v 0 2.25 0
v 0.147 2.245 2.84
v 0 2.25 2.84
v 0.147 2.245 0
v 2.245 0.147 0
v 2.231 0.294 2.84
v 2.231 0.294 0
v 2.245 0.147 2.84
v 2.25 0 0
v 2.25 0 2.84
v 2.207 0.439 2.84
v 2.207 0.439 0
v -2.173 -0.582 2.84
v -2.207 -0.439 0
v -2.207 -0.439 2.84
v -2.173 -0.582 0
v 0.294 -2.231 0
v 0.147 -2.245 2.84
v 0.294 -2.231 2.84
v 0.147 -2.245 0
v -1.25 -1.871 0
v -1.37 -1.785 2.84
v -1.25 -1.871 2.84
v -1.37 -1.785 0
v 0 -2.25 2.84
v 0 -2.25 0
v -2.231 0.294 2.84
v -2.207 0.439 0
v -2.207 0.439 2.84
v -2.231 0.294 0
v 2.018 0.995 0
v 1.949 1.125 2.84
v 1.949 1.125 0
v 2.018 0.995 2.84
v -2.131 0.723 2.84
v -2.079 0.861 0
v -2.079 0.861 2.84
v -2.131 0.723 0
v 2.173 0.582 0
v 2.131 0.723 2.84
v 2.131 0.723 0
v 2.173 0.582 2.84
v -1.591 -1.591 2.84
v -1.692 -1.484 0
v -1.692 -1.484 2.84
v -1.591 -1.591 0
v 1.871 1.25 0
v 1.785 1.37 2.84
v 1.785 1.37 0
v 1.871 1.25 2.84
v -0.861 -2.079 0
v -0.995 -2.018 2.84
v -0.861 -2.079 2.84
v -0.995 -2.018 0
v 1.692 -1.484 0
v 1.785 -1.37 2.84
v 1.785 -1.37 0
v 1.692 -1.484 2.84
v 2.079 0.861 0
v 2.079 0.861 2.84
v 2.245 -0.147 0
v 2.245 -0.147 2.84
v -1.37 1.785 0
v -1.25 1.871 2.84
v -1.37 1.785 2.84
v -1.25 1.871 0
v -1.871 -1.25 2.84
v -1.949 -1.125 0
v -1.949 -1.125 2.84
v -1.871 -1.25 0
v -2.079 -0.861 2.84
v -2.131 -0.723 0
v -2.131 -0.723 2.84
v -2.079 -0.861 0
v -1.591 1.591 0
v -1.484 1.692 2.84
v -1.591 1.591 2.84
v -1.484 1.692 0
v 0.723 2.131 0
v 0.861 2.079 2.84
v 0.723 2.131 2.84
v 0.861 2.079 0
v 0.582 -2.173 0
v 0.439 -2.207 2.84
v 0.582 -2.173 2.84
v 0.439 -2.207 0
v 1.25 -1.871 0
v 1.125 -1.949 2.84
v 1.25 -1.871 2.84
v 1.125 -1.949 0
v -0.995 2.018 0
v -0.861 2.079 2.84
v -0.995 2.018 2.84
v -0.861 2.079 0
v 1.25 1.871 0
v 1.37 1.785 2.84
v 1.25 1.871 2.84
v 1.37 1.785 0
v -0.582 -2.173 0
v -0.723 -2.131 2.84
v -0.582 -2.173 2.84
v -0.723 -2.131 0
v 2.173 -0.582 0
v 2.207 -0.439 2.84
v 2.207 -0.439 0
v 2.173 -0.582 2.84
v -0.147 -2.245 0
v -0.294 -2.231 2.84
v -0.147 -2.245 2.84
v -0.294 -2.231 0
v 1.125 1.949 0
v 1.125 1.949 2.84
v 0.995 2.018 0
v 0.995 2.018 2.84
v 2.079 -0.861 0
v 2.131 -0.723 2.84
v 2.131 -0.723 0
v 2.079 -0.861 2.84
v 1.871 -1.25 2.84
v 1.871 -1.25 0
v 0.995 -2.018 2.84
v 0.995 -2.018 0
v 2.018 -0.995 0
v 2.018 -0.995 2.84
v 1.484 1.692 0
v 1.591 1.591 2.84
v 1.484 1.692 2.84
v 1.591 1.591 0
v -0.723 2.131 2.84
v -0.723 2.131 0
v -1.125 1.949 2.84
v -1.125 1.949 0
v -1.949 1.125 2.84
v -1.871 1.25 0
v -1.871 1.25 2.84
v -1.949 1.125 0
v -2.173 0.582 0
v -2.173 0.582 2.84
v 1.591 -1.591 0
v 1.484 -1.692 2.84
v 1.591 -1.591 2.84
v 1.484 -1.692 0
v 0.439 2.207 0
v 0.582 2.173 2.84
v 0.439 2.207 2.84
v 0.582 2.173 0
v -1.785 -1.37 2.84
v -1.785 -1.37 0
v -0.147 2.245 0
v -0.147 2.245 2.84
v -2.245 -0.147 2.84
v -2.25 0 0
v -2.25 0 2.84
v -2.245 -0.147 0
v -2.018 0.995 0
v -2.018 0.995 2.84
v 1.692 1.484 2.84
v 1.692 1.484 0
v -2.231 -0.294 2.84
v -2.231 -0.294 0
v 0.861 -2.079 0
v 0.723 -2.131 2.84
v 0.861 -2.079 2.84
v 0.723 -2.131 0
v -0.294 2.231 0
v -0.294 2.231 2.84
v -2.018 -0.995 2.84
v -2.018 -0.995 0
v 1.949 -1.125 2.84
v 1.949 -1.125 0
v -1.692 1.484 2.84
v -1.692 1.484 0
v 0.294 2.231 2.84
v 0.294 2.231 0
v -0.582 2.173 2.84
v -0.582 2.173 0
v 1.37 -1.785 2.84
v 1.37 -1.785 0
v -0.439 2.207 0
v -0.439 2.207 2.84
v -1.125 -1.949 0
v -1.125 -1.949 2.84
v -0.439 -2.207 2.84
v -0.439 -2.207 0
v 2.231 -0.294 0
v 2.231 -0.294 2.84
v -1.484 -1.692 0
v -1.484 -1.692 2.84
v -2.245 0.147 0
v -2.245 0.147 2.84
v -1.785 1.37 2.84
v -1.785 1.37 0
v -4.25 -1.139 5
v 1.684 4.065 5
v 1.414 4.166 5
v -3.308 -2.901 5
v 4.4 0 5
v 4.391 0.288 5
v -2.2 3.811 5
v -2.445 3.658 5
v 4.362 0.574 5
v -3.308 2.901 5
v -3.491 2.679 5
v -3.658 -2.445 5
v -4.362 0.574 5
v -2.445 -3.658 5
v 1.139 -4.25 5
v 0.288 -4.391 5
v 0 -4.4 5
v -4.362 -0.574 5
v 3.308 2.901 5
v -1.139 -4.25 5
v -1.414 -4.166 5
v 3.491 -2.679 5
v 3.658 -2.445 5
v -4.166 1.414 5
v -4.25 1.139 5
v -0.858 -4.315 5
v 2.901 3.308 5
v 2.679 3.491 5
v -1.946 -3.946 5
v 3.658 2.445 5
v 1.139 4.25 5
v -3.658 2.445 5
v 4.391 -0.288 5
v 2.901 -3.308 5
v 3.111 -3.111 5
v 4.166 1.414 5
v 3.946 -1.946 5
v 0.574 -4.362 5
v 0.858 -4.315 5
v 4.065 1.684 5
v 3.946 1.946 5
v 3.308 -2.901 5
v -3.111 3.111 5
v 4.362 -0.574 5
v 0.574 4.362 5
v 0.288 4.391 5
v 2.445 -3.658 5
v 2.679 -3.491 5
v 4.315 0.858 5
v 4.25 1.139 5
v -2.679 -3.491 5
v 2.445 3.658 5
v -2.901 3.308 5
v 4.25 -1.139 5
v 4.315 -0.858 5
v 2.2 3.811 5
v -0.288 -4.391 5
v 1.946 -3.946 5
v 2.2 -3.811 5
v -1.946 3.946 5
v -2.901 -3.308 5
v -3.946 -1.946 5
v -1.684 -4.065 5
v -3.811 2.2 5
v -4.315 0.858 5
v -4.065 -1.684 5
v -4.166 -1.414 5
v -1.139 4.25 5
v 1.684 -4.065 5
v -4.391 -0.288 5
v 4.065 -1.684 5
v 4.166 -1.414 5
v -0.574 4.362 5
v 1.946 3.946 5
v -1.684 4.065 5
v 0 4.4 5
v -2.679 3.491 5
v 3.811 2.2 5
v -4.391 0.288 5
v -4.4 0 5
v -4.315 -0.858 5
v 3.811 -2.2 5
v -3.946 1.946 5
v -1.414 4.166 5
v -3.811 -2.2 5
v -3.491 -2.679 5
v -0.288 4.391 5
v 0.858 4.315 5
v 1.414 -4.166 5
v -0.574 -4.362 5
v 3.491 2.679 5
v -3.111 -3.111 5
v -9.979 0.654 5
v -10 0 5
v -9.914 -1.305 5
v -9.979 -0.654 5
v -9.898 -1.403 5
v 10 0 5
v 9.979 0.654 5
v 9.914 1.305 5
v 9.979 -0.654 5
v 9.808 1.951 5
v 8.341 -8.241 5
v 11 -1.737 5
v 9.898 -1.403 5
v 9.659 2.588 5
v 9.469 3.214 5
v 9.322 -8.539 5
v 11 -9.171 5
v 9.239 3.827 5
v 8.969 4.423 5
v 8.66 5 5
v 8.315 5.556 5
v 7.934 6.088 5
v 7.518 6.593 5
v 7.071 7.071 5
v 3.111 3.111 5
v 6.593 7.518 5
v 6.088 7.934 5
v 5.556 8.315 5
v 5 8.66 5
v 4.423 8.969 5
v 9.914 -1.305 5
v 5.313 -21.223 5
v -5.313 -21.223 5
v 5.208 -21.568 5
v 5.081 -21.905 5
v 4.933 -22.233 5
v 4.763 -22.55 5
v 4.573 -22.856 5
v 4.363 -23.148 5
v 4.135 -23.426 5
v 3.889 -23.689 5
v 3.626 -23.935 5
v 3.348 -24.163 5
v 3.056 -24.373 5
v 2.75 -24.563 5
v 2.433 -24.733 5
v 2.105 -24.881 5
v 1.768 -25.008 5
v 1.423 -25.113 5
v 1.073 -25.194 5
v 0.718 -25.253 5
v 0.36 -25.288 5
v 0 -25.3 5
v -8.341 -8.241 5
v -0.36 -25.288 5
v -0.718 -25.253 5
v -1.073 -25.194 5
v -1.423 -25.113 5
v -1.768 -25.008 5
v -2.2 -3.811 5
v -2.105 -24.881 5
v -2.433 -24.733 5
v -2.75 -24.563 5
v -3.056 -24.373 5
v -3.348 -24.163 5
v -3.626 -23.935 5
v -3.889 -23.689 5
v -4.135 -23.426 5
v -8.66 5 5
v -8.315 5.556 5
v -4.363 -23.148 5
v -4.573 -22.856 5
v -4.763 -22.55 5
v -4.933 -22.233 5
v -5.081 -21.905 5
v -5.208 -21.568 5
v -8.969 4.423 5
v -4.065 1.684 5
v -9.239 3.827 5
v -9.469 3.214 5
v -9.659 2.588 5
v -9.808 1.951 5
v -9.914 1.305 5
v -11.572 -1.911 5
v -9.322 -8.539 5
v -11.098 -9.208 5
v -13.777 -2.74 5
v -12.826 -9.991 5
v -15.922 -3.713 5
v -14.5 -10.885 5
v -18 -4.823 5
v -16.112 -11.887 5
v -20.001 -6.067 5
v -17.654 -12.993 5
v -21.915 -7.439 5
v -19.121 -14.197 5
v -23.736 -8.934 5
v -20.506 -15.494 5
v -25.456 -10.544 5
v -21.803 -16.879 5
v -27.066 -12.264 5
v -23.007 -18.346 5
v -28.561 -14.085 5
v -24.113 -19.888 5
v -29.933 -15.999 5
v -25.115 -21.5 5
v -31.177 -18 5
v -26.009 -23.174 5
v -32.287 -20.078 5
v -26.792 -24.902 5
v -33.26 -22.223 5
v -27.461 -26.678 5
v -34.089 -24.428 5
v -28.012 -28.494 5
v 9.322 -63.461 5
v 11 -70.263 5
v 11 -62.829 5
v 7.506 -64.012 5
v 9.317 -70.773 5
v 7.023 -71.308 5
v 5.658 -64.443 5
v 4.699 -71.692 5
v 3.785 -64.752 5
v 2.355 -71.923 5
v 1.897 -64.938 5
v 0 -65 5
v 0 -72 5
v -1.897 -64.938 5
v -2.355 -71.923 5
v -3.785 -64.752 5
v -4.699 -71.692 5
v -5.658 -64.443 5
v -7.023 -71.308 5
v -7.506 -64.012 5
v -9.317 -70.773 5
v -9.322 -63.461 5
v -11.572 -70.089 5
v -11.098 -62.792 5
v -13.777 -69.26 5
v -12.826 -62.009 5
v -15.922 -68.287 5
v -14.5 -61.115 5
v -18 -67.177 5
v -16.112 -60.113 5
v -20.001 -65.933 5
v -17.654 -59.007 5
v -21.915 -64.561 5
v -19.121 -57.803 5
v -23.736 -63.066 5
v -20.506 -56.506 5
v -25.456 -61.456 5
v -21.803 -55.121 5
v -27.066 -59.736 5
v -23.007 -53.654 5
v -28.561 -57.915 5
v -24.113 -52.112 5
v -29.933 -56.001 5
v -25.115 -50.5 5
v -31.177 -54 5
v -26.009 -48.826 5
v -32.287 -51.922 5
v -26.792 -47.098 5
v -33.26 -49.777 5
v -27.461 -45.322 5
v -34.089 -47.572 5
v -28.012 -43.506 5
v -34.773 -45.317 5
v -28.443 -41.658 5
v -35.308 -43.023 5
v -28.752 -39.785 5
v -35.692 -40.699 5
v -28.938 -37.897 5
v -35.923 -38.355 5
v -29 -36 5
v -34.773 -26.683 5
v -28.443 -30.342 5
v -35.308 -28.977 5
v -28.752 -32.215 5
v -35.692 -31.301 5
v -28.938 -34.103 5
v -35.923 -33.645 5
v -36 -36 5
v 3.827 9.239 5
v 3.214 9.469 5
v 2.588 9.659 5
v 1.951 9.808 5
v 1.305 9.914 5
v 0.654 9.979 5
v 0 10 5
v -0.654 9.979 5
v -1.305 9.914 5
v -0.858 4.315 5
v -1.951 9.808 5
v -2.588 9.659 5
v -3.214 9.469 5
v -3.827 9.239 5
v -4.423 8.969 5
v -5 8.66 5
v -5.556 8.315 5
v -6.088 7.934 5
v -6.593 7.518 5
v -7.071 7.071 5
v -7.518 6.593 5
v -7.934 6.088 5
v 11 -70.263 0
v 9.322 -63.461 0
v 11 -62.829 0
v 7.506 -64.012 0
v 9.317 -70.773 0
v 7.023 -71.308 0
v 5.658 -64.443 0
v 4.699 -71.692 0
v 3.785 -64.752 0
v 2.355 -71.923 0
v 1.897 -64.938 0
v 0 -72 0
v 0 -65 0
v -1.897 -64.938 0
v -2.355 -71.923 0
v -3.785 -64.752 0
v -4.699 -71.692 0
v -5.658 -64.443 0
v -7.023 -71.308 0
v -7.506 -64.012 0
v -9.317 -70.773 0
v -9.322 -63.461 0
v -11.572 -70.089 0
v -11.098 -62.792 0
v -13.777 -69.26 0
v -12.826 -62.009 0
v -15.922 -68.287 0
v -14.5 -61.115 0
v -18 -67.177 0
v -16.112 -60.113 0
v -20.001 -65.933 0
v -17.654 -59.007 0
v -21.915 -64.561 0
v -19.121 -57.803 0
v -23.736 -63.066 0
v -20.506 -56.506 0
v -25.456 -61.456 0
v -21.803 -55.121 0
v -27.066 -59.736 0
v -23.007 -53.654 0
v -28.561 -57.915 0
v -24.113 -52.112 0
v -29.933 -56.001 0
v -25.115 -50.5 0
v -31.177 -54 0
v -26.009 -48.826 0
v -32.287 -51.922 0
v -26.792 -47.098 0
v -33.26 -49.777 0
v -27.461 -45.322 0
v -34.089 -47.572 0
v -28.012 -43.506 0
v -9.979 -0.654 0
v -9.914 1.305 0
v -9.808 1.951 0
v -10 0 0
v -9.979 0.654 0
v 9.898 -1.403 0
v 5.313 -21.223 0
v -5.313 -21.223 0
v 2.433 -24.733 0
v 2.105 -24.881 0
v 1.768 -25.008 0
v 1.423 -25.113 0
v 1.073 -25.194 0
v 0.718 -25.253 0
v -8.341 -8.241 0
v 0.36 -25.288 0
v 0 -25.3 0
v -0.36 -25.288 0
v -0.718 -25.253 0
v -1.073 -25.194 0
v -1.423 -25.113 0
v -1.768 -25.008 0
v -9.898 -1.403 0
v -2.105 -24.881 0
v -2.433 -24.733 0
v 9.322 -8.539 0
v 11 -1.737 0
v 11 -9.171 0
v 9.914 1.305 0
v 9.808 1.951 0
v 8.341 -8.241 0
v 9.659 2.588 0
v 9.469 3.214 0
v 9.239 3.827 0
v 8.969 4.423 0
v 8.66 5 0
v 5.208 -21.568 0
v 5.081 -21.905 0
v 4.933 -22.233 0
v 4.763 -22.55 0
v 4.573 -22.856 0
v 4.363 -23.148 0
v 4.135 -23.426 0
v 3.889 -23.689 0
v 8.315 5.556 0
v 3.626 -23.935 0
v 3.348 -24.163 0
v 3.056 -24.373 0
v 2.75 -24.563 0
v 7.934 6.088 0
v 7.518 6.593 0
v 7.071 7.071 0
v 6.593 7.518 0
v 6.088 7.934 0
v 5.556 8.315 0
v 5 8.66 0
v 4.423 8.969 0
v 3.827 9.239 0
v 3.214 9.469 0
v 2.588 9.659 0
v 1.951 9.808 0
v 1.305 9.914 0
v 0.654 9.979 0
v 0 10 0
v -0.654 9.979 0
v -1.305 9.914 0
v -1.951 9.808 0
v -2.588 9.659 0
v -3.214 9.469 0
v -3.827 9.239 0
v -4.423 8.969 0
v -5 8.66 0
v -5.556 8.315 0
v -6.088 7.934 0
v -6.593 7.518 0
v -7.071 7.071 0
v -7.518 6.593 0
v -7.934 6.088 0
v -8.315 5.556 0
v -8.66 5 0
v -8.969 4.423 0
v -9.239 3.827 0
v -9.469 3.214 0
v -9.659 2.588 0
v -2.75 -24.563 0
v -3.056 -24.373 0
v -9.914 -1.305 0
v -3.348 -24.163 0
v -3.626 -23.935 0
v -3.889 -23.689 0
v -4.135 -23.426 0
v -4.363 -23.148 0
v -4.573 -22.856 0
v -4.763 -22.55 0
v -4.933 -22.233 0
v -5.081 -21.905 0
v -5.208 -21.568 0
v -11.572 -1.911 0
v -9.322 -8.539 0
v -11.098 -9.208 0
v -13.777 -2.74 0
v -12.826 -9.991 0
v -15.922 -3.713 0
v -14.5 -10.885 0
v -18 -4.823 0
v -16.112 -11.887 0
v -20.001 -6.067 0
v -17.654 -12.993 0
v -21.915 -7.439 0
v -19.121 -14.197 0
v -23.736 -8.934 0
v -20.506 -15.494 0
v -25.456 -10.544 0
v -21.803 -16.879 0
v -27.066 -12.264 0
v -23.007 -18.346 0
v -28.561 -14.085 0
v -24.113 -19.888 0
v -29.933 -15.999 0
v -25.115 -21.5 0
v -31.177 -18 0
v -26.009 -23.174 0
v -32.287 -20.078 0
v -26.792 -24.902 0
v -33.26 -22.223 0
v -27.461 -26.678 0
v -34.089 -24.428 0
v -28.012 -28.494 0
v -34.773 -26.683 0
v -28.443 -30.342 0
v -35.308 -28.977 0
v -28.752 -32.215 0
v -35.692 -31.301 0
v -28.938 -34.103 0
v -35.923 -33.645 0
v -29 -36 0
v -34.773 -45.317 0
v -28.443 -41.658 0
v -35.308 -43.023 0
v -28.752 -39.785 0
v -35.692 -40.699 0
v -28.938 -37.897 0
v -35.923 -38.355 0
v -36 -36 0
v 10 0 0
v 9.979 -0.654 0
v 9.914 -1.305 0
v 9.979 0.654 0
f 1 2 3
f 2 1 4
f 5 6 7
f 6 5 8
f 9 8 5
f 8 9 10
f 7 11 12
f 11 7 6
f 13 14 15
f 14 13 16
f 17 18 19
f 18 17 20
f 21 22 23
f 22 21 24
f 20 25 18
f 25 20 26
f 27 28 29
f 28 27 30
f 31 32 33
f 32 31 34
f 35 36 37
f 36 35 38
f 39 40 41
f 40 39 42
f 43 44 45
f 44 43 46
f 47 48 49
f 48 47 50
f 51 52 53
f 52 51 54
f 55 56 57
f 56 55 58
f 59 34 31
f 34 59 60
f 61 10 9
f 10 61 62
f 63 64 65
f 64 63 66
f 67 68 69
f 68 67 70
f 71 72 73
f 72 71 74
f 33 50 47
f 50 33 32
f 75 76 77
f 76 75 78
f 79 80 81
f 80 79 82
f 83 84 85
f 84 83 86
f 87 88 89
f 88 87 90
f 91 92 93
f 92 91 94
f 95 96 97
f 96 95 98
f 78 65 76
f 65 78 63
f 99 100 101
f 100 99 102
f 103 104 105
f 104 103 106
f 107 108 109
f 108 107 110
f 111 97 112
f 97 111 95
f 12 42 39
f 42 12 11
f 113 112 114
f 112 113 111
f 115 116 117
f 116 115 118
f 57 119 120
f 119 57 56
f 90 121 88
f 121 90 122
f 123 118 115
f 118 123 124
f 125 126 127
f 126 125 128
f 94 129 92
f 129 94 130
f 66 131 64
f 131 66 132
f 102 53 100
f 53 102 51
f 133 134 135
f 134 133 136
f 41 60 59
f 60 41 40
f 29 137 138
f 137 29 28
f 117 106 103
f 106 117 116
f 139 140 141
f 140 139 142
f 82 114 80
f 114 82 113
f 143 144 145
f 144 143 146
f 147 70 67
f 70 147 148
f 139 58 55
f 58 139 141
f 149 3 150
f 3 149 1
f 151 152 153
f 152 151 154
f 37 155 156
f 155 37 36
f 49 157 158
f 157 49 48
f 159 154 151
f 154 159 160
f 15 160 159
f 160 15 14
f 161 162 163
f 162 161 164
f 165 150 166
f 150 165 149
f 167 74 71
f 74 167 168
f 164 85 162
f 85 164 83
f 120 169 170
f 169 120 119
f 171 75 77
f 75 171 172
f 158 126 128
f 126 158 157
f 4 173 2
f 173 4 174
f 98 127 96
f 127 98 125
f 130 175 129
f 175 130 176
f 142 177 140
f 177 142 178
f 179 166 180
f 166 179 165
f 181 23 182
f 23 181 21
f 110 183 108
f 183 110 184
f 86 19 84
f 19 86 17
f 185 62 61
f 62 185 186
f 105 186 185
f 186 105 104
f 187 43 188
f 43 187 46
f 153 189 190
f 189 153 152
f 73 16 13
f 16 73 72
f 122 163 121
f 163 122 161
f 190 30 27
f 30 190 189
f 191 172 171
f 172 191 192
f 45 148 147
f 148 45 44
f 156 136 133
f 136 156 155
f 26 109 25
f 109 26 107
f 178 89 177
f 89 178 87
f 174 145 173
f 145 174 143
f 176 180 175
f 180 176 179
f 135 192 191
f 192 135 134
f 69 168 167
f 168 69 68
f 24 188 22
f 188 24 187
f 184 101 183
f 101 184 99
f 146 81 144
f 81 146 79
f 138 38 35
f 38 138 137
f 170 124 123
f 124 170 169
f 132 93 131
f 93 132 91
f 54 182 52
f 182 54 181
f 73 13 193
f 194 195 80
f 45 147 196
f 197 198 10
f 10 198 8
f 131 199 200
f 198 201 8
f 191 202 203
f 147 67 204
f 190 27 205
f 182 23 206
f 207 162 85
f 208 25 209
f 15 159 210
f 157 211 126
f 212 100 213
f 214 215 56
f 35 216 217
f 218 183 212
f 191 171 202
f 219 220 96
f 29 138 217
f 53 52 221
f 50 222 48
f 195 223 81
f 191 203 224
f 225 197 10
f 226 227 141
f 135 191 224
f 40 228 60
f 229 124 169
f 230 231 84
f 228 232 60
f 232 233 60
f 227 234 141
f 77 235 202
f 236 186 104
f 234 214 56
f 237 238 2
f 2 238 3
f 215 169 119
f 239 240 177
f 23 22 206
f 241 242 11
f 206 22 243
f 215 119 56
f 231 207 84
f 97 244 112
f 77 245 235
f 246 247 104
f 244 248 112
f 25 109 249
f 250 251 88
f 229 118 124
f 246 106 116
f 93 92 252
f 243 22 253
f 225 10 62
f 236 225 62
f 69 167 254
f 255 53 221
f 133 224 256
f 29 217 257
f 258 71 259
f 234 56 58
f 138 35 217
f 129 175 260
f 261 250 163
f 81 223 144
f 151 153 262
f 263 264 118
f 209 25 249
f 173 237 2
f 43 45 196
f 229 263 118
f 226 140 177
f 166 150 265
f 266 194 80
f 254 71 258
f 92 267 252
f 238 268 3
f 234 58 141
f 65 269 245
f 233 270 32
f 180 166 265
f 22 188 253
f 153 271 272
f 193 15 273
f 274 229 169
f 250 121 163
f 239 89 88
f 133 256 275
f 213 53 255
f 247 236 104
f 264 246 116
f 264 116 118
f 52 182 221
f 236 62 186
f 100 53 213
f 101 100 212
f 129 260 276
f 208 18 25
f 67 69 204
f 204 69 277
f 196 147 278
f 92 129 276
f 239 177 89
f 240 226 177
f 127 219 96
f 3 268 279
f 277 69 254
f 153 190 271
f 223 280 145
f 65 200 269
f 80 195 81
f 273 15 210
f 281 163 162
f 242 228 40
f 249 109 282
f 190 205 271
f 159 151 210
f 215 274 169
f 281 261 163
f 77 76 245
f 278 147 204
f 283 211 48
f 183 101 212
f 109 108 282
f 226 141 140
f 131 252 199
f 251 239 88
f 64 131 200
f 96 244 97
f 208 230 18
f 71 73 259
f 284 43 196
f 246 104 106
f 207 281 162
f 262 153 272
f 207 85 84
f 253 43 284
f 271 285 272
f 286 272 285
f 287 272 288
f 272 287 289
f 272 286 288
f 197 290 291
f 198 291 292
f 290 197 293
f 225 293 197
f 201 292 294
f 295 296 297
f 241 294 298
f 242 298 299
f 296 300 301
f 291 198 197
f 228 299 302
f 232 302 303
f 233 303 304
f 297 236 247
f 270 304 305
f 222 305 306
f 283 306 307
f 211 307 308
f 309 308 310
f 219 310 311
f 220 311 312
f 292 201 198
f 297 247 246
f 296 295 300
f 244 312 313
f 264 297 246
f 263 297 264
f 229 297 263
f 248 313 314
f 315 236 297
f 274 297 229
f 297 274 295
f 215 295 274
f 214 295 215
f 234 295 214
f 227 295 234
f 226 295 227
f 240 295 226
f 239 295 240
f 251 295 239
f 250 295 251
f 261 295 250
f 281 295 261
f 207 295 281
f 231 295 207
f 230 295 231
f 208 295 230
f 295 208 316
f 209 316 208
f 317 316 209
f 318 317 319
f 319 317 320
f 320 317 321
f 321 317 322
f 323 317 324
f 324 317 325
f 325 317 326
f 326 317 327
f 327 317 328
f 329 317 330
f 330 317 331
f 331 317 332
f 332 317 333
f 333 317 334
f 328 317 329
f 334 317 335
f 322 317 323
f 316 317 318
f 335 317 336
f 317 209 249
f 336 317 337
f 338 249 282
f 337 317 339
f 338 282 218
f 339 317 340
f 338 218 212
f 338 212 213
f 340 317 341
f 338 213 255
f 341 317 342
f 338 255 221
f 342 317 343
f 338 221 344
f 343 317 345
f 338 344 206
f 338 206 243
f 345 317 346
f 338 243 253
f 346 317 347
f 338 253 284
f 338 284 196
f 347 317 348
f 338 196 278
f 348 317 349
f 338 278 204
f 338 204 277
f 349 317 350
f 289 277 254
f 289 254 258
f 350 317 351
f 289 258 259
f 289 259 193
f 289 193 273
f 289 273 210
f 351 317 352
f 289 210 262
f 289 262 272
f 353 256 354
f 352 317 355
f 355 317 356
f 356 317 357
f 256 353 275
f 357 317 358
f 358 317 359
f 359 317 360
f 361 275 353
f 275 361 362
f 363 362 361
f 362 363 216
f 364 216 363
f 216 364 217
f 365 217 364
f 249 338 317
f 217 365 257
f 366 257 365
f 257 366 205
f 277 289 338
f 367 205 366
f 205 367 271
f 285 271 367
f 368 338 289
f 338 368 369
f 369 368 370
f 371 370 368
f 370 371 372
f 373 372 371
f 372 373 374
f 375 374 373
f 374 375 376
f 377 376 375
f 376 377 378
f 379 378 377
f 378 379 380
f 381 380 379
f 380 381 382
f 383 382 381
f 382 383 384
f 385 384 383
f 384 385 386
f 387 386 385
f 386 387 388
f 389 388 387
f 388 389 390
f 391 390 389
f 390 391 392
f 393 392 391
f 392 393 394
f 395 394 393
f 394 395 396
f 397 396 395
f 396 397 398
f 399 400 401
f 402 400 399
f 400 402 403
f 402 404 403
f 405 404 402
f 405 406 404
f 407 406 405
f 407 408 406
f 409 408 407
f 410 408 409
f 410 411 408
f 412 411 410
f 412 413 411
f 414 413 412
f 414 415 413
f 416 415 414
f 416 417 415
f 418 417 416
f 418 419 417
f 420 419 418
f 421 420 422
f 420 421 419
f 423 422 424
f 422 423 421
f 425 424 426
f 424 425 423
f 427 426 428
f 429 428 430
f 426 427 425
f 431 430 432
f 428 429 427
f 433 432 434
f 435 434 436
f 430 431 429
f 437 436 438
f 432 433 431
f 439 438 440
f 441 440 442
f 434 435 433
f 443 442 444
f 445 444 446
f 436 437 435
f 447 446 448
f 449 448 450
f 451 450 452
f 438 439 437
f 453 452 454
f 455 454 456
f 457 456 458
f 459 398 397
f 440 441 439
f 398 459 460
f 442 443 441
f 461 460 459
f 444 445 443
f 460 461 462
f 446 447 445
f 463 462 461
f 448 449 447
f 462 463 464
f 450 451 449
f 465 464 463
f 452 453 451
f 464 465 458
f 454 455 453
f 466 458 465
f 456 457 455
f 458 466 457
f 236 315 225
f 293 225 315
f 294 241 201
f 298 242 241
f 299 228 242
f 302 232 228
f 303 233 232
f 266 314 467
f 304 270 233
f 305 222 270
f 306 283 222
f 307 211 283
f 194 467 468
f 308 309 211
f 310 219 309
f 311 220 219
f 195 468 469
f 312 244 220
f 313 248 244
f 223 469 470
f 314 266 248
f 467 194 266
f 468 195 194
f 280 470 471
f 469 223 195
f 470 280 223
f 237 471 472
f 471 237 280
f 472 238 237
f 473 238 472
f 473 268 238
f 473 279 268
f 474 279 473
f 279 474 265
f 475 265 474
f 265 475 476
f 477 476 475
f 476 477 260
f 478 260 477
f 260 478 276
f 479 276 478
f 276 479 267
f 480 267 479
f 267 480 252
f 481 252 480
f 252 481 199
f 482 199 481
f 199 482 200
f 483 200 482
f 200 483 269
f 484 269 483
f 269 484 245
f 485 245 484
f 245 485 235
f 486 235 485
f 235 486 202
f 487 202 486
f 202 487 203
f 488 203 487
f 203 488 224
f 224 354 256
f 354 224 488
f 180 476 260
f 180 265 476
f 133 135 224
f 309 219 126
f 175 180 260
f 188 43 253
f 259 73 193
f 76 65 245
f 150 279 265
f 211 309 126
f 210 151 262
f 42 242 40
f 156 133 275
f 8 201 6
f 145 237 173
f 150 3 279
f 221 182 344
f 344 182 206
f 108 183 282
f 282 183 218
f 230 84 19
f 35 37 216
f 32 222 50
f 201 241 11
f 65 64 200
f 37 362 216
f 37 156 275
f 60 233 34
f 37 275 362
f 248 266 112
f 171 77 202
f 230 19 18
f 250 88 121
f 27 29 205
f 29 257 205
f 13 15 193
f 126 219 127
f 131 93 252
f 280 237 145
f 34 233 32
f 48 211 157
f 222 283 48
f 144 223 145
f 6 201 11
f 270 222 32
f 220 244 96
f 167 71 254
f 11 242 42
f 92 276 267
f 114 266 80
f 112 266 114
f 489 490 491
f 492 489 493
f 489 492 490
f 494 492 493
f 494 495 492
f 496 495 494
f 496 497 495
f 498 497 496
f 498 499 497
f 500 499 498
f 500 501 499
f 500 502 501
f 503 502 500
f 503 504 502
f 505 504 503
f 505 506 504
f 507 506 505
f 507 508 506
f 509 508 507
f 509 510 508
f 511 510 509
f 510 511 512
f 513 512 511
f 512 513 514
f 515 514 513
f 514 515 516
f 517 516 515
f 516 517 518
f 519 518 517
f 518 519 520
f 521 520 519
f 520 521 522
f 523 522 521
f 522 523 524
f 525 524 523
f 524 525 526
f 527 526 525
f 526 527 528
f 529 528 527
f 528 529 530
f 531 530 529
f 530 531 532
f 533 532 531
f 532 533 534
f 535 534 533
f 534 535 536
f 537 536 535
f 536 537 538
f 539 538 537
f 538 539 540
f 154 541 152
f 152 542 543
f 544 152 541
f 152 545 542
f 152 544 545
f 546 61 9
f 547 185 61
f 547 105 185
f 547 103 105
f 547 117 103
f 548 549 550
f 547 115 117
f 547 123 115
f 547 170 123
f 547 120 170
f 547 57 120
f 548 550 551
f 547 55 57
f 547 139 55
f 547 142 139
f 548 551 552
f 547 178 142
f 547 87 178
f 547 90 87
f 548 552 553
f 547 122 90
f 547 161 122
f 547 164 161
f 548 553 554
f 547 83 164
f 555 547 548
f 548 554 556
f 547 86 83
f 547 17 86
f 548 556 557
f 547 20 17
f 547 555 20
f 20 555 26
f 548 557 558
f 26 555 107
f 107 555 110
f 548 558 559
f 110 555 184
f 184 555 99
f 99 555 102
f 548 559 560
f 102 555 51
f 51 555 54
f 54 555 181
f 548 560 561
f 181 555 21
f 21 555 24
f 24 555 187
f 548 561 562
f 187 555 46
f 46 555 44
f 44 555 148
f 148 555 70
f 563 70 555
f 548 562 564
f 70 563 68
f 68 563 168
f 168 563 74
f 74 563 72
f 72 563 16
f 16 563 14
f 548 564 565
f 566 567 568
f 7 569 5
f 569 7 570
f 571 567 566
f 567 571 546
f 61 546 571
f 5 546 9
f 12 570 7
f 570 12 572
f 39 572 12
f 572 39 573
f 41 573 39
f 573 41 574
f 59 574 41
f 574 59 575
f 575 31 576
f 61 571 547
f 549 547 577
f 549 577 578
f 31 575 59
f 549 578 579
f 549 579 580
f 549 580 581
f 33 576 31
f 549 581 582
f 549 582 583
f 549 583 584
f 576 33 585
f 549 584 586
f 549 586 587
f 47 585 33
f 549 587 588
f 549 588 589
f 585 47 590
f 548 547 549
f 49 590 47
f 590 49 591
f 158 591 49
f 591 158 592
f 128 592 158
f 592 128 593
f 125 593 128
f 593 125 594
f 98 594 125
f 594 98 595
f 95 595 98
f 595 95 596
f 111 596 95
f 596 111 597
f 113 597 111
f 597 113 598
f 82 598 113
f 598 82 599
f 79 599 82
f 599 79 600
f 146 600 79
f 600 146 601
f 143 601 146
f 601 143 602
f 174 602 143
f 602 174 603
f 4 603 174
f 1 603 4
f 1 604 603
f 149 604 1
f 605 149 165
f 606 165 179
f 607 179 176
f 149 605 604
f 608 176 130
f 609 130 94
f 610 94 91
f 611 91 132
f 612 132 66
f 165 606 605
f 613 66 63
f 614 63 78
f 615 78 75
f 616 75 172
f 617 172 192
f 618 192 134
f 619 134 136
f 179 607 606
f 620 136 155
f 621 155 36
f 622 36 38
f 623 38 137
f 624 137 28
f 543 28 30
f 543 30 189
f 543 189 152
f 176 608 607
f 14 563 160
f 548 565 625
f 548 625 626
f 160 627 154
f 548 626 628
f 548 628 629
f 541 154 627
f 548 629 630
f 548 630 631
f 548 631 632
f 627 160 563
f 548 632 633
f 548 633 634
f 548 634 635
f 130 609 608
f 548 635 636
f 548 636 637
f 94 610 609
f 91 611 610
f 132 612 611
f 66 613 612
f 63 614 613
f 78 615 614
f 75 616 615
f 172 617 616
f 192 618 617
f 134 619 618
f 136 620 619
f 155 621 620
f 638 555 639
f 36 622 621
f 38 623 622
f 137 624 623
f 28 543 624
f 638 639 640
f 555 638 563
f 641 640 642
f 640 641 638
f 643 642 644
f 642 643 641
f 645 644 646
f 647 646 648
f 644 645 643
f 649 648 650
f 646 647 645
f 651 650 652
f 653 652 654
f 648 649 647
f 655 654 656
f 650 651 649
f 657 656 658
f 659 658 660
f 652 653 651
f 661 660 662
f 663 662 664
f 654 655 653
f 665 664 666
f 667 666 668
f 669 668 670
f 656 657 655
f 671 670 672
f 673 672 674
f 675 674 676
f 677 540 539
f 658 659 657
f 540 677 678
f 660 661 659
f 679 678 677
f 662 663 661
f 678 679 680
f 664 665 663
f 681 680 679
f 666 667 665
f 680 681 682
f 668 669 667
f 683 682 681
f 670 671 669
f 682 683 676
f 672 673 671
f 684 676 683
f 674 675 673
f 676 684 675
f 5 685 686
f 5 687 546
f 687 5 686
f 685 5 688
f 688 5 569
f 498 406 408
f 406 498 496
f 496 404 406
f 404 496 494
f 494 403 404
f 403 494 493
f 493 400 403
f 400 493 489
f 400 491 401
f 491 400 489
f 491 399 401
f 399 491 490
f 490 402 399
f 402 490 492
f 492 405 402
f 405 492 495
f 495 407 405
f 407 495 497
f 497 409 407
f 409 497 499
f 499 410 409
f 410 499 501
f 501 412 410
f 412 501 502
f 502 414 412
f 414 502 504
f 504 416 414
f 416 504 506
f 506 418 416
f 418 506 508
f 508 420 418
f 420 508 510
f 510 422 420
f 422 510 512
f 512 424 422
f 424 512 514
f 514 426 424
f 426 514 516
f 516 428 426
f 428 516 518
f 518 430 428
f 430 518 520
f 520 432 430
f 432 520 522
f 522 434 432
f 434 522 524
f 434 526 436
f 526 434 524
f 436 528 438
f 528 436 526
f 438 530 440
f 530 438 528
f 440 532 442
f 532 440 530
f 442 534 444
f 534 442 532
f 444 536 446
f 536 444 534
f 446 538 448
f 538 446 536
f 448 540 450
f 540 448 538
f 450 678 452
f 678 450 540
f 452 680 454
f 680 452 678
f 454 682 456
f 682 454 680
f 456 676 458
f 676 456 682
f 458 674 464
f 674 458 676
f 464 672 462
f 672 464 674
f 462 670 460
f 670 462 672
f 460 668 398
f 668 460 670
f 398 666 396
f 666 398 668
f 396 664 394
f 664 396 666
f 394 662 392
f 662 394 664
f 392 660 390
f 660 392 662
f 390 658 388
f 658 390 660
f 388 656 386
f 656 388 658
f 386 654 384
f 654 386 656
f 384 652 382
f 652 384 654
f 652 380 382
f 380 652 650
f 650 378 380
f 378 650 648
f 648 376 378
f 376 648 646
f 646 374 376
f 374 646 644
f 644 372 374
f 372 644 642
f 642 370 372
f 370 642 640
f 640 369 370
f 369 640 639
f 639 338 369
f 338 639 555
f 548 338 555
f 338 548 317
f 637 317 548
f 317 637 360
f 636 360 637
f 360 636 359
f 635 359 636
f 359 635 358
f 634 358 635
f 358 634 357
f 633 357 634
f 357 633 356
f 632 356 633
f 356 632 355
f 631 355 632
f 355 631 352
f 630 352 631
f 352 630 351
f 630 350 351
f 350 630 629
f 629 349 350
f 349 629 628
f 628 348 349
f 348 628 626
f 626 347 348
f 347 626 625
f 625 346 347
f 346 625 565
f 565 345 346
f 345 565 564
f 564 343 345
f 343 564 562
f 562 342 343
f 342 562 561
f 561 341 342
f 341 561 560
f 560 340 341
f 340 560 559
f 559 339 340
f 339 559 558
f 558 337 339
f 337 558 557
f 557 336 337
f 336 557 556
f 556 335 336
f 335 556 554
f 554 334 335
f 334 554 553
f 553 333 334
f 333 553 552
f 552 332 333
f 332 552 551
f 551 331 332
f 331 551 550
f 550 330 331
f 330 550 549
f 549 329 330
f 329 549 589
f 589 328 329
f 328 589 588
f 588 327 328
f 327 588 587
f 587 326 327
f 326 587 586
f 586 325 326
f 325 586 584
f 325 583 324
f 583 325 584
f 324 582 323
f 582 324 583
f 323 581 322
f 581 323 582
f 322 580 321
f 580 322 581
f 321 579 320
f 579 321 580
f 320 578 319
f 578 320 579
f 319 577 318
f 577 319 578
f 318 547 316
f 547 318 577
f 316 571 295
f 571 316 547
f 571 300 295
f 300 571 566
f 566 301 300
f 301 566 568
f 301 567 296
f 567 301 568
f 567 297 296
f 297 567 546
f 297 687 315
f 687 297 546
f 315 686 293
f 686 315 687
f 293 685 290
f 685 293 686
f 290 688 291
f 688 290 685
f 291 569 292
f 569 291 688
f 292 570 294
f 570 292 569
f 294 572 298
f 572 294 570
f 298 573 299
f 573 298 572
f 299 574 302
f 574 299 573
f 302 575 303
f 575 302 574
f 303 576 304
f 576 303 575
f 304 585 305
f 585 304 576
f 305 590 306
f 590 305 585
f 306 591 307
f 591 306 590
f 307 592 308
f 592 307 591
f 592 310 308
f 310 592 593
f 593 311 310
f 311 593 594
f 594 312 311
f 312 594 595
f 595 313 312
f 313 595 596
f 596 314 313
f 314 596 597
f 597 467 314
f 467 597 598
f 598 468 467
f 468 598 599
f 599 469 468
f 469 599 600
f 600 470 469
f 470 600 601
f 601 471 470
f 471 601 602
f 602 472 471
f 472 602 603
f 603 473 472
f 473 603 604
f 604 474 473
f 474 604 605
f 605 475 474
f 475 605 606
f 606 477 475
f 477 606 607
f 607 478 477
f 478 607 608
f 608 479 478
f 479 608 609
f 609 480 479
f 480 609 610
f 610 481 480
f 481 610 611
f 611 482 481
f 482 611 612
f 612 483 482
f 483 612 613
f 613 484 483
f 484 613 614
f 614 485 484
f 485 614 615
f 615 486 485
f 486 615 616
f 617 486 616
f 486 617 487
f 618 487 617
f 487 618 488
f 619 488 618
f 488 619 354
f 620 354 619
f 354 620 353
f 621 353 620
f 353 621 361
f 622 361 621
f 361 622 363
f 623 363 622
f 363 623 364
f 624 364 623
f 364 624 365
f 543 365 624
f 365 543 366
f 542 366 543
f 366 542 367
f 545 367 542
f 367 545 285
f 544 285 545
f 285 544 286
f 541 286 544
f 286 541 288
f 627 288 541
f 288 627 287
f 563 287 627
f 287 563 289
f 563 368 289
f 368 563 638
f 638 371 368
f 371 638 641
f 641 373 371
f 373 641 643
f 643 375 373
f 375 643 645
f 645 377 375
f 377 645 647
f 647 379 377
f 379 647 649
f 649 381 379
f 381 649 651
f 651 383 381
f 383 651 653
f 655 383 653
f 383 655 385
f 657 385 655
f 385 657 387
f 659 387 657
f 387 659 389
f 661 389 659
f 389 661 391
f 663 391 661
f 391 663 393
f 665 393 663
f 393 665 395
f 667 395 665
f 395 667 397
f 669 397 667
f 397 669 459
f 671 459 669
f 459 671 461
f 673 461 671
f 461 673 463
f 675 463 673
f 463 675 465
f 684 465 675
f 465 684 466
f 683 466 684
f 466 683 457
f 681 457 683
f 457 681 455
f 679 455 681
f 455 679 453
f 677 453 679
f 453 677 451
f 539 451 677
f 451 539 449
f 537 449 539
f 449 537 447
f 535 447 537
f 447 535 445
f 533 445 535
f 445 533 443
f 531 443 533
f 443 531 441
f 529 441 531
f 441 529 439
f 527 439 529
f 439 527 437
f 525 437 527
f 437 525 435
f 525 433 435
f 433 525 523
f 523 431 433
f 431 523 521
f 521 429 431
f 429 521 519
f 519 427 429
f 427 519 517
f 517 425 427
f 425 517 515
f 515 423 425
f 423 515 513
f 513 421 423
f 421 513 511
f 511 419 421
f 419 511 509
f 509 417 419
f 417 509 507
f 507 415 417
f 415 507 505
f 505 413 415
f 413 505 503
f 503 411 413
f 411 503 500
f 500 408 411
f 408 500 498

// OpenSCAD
// Parametric ceiling hook for side-printing.
// The default render is already oriented flat for printing so the layer lines
// follow the hook profile instead of stacking through the loaded section.

$fn = 96;
eps = 0.01;

render_mode = "print"; // "print" or "installed"

// Core sizing.
hook_width_mm = 5;
thing_diameter_mm = 55;
fit_clearance_mm = 3;
hook_wall_mm = 7;
mouth_opening_mm = 18;

// Mounting and fastener sizing.
mount_pad_radius_mm = 10;
web_thickness_mm = 11;
screw_shank_diameter_mm = 4.5;
screw_head_diameter_mm = 8.8;
screw_head_angle_deg = 90;
countersink_on_top = true;

clear_diameter_mm = thing_diameter_mm + fit_clearance_mm;
inner_radius_mm = clear_diameter_mm / 2;
outer_radius_mm = inner_radius_mm + hook_wall_mm;
ring_center_y_mm = -outer_radius_mm;
mouth_cut_x_mm = inner_radius_mm - mouth_opening_mm;
web_anchor_y_mm = ring_center_y_mm + (outer_radius_mm * 0.45);
countersink_depth_mm =
    (screw_head_diameter_mm - screw_shank_diameter_mm)
    / (2 * tan(screw_head_angle_deg / 2));

assert(hook_width_mm > 0, "hook_width_mm must be positive.");
assert(thing_diameter_mm > 0, "thing_diameter_mm must be positive.");
assert(fit_clearance_mm >= 0, "fit_clearance_mm must be zero or positive.");
assert(hook_wall_mm > 0, "hook_wall_mm must be positive.");
assert(mouth_opening_mm > 0, "mouth_opening_mm must be positive.");
assert(mouth_cut_x_mm < inner_radius_mm, "mouth_opening_mm is too large.");
assert(mount_pad_radius_mm > (screw_head_diameter_mm / 2), "mount_pad_radius_mm is too small for the screw head.");
assert(web_thickness_mm > 0, "web_thickness_mm must be positive.");
assert(screw_shank_diameter_mm > 0, "screw_shank_diameter_mm must be positive.");
assert(screw_head_diameter_mm > screw_shank_diameter_mm, "screw_head_diameter_mm must be larger than the shank.");
assert(screw_head_angle_deg > 0 && screw_head_angle_deg < 180, "screw_head_angle_deg must be between 0 and 180.");
assert(countersink_depth_mm < hook_width_mm, "Countersink is deeper than the hook width.");

echo(str("Clear inside diameter: ", clear_diameter_mm, " mm"));
echo(str("Outer diameter: ", 2 * outer_radius_mm, " mm"));
echo(str("Lowest point is directly under screw hole center at X = 0 mm"));

module ring_2d() {
    difference() {
        circle(r = outer_radius_mm);
        circle(r = inner_radius_mm);
    }
}

module c_hook_2d() {
    translate([0, ring_center_y_mm])
        difference() {
            ring_2d();
            translate([mouth_cut_x_mm, -outer_radius_mm - eps])
                square([outer_radius_mm * 2 + mount_pad_radius_mm, outer_radius_mm * 2 + (2 * eps)]);
        }
}

module hook_profile_2d() {
    union() {
        c_hook_2d();

        circle(r = mount_pad_radius_mm);

        hull() {
            circle(r = mount_pad_radius_mm);
            translate([0, web_anchor_y_mm])
                circle(r = web_thickness_mm / 2);
        }
    }
}

module hook_body() {
    linear_extrude(height = hook_width_mm, convexity = 10)
        hook_profile_2d();
}

module screw_cut() {
    translate([0, 0, -eps])
        cylinder(d = screw_shank_diameter_mm, h = hook_width_mm + (2 * eps));

    if (countersink_on_top)
        translate([0, 0, hook_width_mm - countersink_depth_mm - eps])
            cylinder(
                d1 = screw_shank_diameter_mm,
                d2 = screw_head_diameter_mm,
                h = countersink_depth_mm + eps
            );
    else
        translate([0, 0, -eps])
            cylinder(
                d1 = screw_head_diameter_mm,
                d2 = screw_shank_diameter_mm,
                h = countersink_depth_mm + eps
            );
}

module printable_hook() {
    difference() {
        hook_body();
        screw_cut();
    }
}

module installed_hook() {
    rotate([90, 0, 0])
        printable_hook();
}

if (render_mode == "print")
    printable_hook();
else if (render_mode == "installed")
    installed_hook();
else
    assert(false, "render_mode must be print or installed.");
